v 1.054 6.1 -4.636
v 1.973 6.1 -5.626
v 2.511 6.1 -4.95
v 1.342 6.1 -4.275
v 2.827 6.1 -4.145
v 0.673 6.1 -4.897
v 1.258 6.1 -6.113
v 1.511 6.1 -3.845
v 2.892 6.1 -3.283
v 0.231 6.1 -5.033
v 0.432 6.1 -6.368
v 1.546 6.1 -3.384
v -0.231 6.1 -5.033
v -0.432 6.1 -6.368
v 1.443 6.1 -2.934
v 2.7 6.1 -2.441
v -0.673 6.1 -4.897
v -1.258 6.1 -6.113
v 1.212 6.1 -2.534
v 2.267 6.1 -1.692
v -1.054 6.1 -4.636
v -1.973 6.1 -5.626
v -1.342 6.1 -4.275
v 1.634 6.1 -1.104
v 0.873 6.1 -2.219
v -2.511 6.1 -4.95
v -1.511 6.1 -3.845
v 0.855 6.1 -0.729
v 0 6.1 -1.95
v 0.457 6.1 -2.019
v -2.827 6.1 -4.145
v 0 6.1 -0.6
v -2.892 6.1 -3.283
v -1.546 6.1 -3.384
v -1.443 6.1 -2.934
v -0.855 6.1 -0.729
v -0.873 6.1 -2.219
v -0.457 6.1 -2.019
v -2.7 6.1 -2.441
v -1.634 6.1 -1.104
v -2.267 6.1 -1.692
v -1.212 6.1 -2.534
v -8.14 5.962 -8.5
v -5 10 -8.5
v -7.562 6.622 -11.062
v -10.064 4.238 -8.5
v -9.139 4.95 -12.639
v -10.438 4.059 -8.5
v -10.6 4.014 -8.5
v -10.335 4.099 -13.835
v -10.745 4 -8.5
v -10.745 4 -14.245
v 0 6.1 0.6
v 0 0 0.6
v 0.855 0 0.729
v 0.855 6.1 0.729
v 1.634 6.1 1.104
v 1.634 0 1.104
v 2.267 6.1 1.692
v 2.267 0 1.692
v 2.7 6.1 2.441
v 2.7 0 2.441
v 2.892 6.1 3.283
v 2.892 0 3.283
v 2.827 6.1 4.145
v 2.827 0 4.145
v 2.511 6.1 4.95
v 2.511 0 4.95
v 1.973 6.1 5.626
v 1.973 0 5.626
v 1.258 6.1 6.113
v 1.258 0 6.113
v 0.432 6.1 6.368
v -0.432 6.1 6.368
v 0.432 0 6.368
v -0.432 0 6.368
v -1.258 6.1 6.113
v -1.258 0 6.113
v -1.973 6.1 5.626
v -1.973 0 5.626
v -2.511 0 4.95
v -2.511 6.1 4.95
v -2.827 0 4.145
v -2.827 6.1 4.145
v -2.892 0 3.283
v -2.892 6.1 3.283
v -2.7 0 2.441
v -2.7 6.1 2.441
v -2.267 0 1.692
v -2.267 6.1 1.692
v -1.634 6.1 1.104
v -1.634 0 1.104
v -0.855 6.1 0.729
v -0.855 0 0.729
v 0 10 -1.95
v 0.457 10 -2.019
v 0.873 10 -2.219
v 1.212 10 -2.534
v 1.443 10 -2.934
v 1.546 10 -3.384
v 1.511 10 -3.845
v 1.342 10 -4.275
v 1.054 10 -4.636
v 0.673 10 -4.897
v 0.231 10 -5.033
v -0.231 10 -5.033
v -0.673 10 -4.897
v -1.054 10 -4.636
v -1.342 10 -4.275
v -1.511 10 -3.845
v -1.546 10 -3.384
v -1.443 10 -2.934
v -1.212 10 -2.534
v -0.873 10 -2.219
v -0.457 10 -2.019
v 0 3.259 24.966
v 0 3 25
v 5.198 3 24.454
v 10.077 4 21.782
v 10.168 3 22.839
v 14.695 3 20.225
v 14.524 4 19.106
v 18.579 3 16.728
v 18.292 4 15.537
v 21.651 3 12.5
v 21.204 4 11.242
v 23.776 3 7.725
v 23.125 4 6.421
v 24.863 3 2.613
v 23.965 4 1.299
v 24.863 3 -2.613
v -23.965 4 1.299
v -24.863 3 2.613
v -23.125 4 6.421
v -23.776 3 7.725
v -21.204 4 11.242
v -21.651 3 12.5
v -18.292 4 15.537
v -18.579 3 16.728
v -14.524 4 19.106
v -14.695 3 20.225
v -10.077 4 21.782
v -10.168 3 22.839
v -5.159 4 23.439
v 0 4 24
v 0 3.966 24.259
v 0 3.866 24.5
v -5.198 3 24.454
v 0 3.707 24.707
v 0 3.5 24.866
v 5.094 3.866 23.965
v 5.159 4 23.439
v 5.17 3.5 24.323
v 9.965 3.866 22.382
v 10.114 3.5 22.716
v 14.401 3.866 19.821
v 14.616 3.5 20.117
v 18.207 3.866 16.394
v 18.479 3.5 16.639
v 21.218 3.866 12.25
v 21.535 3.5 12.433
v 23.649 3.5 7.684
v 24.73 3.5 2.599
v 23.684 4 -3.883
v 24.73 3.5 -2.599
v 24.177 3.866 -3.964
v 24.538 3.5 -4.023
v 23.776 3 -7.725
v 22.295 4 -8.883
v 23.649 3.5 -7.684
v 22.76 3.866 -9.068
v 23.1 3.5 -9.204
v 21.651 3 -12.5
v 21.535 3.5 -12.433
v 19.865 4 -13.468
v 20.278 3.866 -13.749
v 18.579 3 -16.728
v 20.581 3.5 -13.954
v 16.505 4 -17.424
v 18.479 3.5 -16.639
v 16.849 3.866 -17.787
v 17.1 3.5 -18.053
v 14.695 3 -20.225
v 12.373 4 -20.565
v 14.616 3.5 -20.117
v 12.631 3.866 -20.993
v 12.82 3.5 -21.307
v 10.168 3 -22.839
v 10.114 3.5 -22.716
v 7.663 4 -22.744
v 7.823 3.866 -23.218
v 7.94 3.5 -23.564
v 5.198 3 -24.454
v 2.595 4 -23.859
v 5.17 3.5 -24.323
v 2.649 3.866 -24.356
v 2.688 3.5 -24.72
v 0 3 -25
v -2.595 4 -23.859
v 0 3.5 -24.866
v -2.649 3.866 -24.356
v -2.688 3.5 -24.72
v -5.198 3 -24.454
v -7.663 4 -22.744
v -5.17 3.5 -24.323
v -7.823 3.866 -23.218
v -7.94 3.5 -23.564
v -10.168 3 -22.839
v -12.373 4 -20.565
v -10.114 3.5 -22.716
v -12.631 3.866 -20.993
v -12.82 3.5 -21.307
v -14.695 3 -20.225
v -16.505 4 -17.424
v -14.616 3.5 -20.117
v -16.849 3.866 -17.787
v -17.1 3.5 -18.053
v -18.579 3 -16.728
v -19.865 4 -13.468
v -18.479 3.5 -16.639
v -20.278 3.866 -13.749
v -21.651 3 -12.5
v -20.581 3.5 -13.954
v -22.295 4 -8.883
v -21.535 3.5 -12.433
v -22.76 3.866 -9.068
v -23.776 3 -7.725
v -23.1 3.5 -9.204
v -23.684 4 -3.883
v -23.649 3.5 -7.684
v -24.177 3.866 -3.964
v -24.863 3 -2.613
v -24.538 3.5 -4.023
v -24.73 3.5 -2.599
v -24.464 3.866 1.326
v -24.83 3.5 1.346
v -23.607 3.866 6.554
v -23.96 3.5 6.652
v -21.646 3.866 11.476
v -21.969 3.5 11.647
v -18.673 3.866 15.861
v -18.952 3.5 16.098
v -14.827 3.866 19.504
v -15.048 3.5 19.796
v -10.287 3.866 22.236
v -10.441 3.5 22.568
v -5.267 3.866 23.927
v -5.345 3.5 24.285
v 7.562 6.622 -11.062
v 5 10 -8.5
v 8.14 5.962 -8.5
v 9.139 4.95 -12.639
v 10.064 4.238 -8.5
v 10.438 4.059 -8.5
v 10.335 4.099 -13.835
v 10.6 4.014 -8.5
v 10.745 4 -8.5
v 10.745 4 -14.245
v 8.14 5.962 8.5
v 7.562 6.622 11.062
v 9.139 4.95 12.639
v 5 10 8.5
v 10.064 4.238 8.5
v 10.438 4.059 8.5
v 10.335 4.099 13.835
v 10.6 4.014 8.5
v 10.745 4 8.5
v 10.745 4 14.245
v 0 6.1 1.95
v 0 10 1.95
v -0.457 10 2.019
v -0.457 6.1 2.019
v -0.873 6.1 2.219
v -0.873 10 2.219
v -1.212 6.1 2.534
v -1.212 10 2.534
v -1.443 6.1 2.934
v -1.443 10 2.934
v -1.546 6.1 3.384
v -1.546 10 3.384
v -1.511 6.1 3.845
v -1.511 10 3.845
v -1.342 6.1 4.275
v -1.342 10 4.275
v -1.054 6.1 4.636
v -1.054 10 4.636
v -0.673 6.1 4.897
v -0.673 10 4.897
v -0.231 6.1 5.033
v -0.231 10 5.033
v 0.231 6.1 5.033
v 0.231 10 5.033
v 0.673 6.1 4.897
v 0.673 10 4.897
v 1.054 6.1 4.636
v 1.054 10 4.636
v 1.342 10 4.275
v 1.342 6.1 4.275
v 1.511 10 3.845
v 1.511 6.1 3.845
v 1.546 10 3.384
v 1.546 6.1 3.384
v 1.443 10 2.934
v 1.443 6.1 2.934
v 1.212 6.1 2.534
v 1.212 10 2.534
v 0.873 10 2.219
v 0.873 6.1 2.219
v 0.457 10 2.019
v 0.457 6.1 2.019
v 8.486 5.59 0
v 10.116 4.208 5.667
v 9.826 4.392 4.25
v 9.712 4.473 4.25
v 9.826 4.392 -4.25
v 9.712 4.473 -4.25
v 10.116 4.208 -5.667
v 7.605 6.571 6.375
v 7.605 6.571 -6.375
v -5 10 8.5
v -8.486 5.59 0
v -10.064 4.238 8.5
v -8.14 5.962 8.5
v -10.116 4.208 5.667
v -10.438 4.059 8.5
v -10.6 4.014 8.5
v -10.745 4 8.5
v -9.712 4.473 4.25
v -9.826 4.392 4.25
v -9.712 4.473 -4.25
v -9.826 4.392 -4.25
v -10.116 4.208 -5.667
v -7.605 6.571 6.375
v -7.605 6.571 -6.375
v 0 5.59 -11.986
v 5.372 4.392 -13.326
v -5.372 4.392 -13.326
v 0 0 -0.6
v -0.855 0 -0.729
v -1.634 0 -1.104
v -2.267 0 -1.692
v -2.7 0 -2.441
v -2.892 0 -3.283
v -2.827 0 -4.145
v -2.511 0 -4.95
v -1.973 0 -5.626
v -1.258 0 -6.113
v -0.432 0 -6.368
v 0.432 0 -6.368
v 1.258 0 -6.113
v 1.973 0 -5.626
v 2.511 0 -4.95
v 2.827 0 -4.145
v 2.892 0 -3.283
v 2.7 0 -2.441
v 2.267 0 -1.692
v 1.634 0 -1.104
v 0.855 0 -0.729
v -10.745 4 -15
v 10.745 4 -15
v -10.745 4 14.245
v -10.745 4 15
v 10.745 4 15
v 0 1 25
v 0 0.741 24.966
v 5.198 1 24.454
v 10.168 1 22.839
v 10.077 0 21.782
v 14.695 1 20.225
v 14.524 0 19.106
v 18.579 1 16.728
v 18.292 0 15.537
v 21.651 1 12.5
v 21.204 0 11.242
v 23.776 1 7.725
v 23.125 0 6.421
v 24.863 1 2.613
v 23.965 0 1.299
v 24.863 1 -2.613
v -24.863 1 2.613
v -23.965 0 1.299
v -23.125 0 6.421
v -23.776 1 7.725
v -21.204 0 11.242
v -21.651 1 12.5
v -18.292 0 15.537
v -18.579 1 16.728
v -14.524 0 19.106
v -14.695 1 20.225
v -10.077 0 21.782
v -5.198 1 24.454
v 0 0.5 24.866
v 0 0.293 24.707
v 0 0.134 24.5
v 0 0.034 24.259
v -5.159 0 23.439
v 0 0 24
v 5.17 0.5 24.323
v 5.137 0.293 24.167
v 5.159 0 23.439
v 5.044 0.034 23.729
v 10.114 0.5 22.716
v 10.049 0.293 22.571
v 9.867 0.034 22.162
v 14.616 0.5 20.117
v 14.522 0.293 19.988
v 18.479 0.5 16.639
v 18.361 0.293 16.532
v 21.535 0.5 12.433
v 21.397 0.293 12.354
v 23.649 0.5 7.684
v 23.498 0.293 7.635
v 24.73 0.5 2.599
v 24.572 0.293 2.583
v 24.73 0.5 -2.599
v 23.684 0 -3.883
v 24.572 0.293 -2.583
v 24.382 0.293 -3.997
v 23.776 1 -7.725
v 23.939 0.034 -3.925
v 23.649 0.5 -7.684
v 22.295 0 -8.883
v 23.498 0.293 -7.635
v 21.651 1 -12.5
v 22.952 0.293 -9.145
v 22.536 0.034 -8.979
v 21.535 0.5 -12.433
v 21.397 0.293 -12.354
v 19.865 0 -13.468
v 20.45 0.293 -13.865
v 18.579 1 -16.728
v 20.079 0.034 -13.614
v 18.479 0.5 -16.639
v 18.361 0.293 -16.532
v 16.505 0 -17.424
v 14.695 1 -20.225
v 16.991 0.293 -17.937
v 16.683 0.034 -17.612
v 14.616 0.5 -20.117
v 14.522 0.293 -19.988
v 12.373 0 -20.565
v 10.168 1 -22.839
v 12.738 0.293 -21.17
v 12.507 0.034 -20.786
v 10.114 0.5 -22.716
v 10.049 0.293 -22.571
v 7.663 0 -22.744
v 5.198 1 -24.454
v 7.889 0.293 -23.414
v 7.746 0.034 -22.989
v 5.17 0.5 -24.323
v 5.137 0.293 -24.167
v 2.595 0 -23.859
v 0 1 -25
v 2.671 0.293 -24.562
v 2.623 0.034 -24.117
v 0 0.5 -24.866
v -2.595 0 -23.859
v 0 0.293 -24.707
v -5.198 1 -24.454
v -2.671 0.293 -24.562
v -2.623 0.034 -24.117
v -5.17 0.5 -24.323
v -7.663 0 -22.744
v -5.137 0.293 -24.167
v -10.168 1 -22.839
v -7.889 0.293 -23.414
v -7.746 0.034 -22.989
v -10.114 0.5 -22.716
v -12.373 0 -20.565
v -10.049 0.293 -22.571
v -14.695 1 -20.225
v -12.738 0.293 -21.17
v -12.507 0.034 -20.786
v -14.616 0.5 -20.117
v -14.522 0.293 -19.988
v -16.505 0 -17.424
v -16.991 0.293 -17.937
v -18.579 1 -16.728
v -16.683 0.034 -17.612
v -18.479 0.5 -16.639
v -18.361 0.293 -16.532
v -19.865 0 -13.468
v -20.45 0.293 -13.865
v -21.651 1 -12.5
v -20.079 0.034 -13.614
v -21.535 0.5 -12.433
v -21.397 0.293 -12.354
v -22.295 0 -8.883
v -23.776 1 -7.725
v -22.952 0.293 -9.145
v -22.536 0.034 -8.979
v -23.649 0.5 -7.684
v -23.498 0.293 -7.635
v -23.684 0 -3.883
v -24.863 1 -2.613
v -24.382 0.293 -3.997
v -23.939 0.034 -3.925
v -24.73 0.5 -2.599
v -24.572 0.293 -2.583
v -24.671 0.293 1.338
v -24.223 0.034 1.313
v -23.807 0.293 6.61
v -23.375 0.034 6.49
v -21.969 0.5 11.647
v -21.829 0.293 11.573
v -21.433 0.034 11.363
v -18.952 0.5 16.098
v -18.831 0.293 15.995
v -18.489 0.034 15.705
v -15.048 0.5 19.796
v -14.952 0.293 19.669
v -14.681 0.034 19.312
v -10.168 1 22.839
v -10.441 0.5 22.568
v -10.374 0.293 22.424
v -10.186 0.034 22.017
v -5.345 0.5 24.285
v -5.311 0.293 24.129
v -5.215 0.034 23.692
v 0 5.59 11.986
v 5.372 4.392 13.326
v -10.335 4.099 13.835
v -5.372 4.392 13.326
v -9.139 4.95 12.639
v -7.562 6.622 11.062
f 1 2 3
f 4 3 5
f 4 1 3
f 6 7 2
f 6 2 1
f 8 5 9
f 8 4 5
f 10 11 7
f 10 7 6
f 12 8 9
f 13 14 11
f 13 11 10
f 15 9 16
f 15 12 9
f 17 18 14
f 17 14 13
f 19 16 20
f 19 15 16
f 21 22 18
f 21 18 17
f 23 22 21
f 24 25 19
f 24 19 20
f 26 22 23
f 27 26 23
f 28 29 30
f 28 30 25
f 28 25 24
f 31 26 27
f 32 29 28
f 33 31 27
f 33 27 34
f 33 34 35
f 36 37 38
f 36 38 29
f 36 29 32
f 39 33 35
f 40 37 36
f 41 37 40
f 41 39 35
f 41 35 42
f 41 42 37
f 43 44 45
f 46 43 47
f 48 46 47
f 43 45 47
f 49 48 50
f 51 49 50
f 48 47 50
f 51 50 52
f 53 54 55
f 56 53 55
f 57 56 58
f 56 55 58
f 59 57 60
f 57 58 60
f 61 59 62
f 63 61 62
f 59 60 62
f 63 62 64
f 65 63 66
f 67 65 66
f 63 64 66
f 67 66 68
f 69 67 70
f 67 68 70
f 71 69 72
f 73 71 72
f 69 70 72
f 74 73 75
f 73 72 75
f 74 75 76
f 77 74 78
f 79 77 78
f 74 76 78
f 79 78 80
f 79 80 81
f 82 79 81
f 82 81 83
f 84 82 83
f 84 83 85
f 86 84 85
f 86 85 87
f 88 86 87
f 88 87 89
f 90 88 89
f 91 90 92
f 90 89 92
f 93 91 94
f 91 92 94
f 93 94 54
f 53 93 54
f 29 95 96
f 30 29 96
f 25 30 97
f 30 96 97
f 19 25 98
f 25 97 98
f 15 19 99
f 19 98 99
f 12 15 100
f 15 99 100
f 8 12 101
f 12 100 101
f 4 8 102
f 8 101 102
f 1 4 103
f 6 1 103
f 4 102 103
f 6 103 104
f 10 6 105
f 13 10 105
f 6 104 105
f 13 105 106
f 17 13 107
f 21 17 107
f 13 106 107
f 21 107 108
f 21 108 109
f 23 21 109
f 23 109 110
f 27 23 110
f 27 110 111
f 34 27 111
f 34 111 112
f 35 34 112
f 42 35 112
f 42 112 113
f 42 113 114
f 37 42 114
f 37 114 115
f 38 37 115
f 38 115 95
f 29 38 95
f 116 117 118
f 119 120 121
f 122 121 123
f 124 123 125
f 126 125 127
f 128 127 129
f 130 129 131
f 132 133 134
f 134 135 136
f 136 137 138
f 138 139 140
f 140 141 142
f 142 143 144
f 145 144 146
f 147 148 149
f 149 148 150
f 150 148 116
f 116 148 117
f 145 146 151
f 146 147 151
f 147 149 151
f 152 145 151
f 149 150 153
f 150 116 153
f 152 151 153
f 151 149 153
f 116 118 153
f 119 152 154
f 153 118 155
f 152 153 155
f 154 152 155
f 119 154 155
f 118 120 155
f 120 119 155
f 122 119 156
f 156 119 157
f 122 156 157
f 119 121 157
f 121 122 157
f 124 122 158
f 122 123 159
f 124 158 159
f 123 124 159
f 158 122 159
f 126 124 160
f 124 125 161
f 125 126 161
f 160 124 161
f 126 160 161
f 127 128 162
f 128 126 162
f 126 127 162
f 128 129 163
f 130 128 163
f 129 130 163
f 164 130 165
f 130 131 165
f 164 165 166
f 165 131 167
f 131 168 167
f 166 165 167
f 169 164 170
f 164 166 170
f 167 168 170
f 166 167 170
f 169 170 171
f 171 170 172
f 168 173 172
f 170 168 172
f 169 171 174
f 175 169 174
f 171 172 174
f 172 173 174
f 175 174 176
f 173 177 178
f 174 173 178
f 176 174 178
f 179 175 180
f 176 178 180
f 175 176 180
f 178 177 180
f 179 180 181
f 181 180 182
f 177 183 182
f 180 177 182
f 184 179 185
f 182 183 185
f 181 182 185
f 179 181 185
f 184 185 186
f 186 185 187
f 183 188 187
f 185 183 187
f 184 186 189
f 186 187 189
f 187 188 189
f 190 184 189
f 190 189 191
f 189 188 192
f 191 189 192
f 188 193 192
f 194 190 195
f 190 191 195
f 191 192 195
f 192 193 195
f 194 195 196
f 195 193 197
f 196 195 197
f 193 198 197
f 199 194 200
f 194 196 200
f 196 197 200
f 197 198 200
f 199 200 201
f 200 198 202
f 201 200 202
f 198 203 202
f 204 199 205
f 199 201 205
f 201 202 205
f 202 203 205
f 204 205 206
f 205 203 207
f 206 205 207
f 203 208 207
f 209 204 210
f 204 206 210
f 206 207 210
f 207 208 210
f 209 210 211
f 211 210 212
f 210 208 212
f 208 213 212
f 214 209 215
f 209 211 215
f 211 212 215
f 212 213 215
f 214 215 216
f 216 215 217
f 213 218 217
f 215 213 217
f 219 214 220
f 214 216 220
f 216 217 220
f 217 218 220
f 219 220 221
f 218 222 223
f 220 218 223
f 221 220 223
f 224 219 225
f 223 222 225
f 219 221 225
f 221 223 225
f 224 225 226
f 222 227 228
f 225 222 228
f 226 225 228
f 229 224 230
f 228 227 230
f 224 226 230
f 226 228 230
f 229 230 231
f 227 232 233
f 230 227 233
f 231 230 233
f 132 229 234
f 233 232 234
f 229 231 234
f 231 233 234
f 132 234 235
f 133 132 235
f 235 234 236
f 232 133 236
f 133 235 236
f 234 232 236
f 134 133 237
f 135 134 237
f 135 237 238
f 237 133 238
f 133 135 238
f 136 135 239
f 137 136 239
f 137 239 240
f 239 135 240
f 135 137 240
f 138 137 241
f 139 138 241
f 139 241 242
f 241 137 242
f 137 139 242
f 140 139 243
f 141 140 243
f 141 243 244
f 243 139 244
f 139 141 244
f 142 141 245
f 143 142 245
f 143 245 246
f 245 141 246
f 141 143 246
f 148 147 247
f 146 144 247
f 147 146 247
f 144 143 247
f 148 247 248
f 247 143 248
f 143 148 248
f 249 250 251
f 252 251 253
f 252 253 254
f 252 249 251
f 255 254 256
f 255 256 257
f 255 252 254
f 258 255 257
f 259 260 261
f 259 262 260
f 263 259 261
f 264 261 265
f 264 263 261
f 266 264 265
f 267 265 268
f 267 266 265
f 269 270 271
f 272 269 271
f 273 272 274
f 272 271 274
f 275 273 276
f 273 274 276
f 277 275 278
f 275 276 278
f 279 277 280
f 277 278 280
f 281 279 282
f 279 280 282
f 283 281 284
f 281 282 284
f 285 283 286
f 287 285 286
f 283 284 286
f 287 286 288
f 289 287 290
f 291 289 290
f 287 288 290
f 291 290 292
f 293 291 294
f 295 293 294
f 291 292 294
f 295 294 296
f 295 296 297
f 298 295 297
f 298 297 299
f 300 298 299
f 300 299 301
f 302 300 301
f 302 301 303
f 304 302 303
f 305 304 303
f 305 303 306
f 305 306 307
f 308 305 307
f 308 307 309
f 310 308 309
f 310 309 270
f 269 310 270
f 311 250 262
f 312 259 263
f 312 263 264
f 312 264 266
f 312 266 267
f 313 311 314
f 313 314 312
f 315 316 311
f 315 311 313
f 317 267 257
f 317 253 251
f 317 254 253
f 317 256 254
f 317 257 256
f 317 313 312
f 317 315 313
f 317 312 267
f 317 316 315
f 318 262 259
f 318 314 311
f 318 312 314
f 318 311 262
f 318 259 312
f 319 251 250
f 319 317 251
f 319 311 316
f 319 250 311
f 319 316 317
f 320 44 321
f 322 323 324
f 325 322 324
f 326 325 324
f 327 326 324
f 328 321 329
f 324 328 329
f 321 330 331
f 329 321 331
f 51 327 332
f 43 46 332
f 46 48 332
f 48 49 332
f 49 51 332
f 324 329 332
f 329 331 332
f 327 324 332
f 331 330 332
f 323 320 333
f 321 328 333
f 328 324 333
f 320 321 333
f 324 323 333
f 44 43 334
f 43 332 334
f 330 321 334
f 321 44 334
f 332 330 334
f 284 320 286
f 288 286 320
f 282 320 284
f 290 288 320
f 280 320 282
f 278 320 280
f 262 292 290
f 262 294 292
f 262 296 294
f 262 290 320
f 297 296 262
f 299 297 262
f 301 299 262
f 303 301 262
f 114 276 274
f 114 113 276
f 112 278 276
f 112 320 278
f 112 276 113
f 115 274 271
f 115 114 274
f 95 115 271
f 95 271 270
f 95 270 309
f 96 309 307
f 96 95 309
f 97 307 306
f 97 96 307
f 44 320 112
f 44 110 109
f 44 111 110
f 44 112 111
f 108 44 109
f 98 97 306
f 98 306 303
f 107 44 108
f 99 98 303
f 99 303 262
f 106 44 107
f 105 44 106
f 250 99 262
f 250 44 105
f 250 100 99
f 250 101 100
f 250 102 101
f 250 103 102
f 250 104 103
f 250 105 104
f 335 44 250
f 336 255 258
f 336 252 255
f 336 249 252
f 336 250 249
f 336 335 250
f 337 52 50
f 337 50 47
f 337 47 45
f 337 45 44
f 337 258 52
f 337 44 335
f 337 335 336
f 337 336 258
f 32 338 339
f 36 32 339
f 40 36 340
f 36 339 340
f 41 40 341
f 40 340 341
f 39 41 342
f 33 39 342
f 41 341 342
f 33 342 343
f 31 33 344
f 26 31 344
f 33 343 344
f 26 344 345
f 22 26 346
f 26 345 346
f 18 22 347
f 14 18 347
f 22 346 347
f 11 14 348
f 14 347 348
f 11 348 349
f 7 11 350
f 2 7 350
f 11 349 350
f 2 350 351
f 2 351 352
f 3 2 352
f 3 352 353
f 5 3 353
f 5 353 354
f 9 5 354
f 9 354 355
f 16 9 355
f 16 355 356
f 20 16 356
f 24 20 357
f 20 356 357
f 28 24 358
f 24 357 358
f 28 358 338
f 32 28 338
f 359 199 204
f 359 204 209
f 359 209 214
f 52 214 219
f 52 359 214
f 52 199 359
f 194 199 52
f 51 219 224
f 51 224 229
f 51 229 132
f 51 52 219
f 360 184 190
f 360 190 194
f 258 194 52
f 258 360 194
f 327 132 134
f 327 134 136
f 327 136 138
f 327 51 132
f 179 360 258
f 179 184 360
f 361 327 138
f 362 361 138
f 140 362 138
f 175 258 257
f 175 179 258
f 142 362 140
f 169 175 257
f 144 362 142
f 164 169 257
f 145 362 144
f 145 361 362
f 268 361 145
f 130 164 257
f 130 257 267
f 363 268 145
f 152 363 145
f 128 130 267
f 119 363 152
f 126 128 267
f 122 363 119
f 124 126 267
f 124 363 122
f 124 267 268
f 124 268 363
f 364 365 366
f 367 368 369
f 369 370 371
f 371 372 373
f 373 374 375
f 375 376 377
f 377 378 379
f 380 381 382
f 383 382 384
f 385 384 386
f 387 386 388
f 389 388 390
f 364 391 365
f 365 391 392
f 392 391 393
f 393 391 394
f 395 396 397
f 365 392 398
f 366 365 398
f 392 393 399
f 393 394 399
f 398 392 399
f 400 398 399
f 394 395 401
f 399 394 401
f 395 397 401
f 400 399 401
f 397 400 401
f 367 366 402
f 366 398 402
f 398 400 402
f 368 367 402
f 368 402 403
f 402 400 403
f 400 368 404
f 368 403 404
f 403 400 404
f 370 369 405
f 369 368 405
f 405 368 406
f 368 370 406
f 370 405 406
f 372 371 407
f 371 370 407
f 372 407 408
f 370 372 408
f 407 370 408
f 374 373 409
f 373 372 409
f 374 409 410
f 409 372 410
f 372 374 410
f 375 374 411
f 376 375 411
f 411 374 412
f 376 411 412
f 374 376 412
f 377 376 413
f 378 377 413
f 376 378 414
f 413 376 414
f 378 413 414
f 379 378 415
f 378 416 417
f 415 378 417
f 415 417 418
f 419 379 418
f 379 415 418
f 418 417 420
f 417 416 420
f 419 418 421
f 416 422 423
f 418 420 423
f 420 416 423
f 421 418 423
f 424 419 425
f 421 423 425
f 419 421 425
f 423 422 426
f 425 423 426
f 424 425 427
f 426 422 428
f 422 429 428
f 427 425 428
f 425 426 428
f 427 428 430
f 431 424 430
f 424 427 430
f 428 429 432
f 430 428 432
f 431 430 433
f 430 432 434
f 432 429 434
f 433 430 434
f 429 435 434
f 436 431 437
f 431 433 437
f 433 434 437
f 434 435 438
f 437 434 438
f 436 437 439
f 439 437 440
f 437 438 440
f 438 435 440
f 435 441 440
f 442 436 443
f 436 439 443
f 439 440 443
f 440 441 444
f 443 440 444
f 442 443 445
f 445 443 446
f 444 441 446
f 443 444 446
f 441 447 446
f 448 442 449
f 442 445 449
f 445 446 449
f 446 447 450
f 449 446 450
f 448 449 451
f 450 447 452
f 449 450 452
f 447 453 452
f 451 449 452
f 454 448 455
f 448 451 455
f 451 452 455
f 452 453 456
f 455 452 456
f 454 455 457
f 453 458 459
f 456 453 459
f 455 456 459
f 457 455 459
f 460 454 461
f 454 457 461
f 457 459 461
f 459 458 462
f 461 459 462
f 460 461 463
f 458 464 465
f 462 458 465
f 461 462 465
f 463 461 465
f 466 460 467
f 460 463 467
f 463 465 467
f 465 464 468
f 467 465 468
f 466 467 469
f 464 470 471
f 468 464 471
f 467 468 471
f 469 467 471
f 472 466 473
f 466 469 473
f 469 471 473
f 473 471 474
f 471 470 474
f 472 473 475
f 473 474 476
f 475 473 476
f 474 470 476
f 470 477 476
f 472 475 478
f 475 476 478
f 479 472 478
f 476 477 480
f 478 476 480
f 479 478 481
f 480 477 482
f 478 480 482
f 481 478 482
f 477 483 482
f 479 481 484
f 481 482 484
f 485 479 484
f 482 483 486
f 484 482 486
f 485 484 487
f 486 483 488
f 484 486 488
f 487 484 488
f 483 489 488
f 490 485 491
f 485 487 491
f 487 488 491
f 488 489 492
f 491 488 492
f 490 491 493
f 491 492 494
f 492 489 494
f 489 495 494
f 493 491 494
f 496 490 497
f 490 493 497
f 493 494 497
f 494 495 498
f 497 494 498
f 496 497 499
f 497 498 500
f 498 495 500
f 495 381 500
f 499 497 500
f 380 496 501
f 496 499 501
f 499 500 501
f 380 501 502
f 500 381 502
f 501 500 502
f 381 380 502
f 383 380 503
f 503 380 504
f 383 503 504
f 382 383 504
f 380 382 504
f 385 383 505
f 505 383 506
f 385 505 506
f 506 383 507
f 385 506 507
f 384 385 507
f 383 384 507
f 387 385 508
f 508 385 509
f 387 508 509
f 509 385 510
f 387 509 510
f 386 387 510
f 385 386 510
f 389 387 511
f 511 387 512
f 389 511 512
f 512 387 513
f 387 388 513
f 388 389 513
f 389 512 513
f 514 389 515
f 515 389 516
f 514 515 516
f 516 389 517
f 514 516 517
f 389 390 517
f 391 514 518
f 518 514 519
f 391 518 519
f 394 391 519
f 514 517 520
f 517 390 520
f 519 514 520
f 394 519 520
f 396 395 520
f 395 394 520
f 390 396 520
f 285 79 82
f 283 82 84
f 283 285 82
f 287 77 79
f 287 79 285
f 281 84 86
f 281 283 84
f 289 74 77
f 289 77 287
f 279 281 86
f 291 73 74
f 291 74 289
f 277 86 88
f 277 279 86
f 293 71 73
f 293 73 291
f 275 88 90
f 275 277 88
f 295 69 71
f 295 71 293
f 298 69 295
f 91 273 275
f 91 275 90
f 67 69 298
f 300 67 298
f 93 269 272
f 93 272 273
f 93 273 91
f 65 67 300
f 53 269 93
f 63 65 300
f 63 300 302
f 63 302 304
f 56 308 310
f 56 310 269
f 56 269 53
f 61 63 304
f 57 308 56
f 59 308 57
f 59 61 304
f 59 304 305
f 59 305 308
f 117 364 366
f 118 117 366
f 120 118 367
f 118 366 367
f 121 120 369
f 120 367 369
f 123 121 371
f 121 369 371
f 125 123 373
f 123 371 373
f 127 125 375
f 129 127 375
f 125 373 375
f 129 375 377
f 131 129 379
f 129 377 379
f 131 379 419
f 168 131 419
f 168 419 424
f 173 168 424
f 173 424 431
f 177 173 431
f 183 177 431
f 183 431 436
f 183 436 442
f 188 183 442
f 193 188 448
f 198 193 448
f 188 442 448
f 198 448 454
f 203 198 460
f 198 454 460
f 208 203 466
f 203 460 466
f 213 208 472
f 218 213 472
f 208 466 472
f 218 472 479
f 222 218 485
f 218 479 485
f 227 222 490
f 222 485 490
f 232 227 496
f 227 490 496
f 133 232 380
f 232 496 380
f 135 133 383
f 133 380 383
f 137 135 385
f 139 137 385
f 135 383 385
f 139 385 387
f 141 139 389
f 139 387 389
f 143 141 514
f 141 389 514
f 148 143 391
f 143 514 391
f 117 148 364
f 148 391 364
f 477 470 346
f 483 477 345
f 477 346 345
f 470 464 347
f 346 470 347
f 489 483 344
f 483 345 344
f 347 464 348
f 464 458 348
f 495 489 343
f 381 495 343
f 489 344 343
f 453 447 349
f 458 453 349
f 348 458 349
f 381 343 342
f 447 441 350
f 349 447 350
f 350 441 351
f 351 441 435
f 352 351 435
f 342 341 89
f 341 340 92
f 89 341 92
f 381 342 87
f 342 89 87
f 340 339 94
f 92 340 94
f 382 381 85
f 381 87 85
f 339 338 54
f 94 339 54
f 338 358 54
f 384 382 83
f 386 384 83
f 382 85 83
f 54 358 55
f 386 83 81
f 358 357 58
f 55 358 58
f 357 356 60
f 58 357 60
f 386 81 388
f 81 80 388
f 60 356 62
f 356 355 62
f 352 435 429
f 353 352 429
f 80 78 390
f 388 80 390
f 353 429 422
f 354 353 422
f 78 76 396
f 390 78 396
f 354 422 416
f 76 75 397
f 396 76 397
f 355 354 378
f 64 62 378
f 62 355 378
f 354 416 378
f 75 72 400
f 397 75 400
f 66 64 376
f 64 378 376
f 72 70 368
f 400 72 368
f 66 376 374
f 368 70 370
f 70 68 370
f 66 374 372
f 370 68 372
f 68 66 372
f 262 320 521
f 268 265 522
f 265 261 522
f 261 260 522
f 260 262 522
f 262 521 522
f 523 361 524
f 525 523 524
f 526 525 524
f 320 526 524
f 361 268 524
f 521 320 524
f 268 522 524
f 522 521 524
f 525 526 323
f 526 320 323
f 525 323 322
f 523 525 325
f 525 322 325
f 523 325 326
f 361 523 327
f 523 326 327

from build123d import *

# Parameters (mm, degrees)
SKETCH2_R           = 25
BOSS_EXTRUDE1_DEPTH = 4
SKETCH3_W           = 10
SKETCH3_H           = 17
BOSS_EXTRUDE2_DEPTH = 6
FILLET1_START       = -8.5
FILLET1_DEPTH       = 17
FILLET1_START_2     = -10.744562747
FILLET1_2_DEPTH     = 21.489125494
FILLET1_START_3     = -15
FILLET1_3_DEPTH     = 30
SKETCH4_R           = 1.55
CUT_EXTRUDE1_DEPTH  = 37.742346142
SKETCH5_R           = 2.9
CUT_EXTRUDE2_DEPTH  = 6.1
FILLET2_R           = 1


with BuildPart() as part:
    # Sketch2 → Boss-Extrude1 (new body)
    with BuildSketch(Plane(origin=(0, 0, 0), x_dir=(1, 0, 0), z_dir=(0, 1, 0))):
        with Locations(Location((0, 0, 0), (0, 0, 270))):
            Circle(SKETCH2_R)
    extrude(amount=BOSS_EXTRUDE1_DEPTH)

    # Sketch3 → Boss-Extrude2 (add)
    with BuildSketch(Plane(origin=(0, 4, 0), x_dir=(1, 0, 0), z_dir=(0, 1, 0))):
        Rectangle(SKETCH3_W, SKETCH3_H)
    extrude(amount=BOSS_EXTRUDE2_DEPTH)

    # Fillet1: read off the stored shape, not the designer's step
    # Fillet1 outline → Fillet1 (add)
    with BuildSketch(Plane.XY.offset(FILLET1_START)):
        with BuildLine():
            Line((-10.744562647, 4), (-5, 4))
            Line((-5, 4), (-5, 10))
            add(Edge.make_bspline(
                [(-5, 10), (-9.177863743, 4), (-10.744562647, 4)],
                knots=[0, 0, 0, 1, 1, 1], degree=2, weights=[1, 0.88640526, 1]))
        make_face()
        with BuildLine():
            add(Edge.make_bspline(
                [(5, 10), (9.177863743, 4), (10.744562647, 4)],
                knots=[0, 0, 0, 1, 1, 1], degree=2, weights=[1, 0.88640526, 1]))
            Line((5, 10), (5, 4))
            Line((5, 4), (10.744562647, 4))
        make_face()
    extrude(amount=FILLET1_DEPTH)

    # Fillet1 2 outline → Fillet1 2 (add)
    with BuildSketch(Plane.YZ.offset(FILLET1_START_2)):
        with BuildLine():
            Line((4, 14.244562647), (4, 8.5))
            Line((4, 8.5), (10, 8.5))
            add(Edge.make_bspline(
                [(10, 8.5), (4, 12.677863743), (4, 14.244562647)],
                knots=[0, 0, 0, 1, 1, 1], degree=2, weights=[1, 0.88640526, 1]))
        make_face()
        with BuildLine():
            add(Edge.make_bspline(
                [(10, -8.5), (4, -12.677863743), (4, -14.244562647)],
                knots=[0, 0, 0, 1, 1, 1], degree=2, weights=[1, 0.88640526, 1]))
            Line((10, -8.5), (4, -8.5))
            Line((4, -8.5), (4, -14.244562647))
        make_face()
    extrude(amount=FILLET1_2_DEPTH)

    # Fillet1 3 outline → Fillet1 3 (cut)
    with BuildSketch(Plane.XY.offset(FILLET1_START_3)):
        with BuildLine():
            add(Edge.make_bspline(
                [(5, 10), (9.177863743, 4), (10.744562647, 4)],
                knots=[0, 0, 0, 1, 1, 1], degree=2, weights=[1, 0.88640526, 1]))
            Line((10.744562647, 4), (10.744562747, 10))
            Line((10.744562747, 10), (5, 10))
        make_face()
        with BuildLine():
            add(Edge.make_bspline(
                [(-5, 10), (-9.177863743, 4), (-10.744562647, 4)],
                knots=[0, 0, 0, 1, 1, 1], degree=2, weights=[1, 0.88640526, 1]))
            Line((-5, 10), (-10.744562747, 10))
            Line((-10.744562747, 10), (-10.744562647, 4))
        make_face()
    extrude(amount=FILLET1_3_DEPTH, mode=Mode.SUBTRACT)

    # Sketch4 → Cut-Extrude1 (cut, through all)
    with BuildSketch(Plane(origin=(0, 10, 0), x_dir=(1, 0, 0), z_dir=(0, 1, 0))):
        with Locations(Location((0, 3.5, 0), (0, 0, 270))):
            Circle(SKETCH4_R)
        with Locations(Location((0, -3.5, 0), (0, 0, 90))):
            Circle(SKETCH4_R)
    extrude(amount=-CUT_EXTRUDE1_DEPTH, mode=Mode.SUBTRACT)

    # Sketch5 → Cut-Extrude2 (cut)
    with BuildSketch(Plane.XZ):
        with Locations(Location((0, 3.5, 0), (0, 0, 270))):
            Circle(SKETCH5_R)
        with Locations(Location((0, -3.5, 0), (0, 0, 90))):
            Circle(SKETCH5_R)
    extrude(amount=-CUT_EXTRUDE2_DEPTH, mode=Mode.SUBTRACT)

    # Fillet2
    fillet2_edges = [part.edges().sort_by_distance(p)[0] for p in [
        (0, 0, -25),
        (0, 4, -25),
    ]]
    fillet(fillet2_edges, radius=FILLET2_R)


solid = part.part
